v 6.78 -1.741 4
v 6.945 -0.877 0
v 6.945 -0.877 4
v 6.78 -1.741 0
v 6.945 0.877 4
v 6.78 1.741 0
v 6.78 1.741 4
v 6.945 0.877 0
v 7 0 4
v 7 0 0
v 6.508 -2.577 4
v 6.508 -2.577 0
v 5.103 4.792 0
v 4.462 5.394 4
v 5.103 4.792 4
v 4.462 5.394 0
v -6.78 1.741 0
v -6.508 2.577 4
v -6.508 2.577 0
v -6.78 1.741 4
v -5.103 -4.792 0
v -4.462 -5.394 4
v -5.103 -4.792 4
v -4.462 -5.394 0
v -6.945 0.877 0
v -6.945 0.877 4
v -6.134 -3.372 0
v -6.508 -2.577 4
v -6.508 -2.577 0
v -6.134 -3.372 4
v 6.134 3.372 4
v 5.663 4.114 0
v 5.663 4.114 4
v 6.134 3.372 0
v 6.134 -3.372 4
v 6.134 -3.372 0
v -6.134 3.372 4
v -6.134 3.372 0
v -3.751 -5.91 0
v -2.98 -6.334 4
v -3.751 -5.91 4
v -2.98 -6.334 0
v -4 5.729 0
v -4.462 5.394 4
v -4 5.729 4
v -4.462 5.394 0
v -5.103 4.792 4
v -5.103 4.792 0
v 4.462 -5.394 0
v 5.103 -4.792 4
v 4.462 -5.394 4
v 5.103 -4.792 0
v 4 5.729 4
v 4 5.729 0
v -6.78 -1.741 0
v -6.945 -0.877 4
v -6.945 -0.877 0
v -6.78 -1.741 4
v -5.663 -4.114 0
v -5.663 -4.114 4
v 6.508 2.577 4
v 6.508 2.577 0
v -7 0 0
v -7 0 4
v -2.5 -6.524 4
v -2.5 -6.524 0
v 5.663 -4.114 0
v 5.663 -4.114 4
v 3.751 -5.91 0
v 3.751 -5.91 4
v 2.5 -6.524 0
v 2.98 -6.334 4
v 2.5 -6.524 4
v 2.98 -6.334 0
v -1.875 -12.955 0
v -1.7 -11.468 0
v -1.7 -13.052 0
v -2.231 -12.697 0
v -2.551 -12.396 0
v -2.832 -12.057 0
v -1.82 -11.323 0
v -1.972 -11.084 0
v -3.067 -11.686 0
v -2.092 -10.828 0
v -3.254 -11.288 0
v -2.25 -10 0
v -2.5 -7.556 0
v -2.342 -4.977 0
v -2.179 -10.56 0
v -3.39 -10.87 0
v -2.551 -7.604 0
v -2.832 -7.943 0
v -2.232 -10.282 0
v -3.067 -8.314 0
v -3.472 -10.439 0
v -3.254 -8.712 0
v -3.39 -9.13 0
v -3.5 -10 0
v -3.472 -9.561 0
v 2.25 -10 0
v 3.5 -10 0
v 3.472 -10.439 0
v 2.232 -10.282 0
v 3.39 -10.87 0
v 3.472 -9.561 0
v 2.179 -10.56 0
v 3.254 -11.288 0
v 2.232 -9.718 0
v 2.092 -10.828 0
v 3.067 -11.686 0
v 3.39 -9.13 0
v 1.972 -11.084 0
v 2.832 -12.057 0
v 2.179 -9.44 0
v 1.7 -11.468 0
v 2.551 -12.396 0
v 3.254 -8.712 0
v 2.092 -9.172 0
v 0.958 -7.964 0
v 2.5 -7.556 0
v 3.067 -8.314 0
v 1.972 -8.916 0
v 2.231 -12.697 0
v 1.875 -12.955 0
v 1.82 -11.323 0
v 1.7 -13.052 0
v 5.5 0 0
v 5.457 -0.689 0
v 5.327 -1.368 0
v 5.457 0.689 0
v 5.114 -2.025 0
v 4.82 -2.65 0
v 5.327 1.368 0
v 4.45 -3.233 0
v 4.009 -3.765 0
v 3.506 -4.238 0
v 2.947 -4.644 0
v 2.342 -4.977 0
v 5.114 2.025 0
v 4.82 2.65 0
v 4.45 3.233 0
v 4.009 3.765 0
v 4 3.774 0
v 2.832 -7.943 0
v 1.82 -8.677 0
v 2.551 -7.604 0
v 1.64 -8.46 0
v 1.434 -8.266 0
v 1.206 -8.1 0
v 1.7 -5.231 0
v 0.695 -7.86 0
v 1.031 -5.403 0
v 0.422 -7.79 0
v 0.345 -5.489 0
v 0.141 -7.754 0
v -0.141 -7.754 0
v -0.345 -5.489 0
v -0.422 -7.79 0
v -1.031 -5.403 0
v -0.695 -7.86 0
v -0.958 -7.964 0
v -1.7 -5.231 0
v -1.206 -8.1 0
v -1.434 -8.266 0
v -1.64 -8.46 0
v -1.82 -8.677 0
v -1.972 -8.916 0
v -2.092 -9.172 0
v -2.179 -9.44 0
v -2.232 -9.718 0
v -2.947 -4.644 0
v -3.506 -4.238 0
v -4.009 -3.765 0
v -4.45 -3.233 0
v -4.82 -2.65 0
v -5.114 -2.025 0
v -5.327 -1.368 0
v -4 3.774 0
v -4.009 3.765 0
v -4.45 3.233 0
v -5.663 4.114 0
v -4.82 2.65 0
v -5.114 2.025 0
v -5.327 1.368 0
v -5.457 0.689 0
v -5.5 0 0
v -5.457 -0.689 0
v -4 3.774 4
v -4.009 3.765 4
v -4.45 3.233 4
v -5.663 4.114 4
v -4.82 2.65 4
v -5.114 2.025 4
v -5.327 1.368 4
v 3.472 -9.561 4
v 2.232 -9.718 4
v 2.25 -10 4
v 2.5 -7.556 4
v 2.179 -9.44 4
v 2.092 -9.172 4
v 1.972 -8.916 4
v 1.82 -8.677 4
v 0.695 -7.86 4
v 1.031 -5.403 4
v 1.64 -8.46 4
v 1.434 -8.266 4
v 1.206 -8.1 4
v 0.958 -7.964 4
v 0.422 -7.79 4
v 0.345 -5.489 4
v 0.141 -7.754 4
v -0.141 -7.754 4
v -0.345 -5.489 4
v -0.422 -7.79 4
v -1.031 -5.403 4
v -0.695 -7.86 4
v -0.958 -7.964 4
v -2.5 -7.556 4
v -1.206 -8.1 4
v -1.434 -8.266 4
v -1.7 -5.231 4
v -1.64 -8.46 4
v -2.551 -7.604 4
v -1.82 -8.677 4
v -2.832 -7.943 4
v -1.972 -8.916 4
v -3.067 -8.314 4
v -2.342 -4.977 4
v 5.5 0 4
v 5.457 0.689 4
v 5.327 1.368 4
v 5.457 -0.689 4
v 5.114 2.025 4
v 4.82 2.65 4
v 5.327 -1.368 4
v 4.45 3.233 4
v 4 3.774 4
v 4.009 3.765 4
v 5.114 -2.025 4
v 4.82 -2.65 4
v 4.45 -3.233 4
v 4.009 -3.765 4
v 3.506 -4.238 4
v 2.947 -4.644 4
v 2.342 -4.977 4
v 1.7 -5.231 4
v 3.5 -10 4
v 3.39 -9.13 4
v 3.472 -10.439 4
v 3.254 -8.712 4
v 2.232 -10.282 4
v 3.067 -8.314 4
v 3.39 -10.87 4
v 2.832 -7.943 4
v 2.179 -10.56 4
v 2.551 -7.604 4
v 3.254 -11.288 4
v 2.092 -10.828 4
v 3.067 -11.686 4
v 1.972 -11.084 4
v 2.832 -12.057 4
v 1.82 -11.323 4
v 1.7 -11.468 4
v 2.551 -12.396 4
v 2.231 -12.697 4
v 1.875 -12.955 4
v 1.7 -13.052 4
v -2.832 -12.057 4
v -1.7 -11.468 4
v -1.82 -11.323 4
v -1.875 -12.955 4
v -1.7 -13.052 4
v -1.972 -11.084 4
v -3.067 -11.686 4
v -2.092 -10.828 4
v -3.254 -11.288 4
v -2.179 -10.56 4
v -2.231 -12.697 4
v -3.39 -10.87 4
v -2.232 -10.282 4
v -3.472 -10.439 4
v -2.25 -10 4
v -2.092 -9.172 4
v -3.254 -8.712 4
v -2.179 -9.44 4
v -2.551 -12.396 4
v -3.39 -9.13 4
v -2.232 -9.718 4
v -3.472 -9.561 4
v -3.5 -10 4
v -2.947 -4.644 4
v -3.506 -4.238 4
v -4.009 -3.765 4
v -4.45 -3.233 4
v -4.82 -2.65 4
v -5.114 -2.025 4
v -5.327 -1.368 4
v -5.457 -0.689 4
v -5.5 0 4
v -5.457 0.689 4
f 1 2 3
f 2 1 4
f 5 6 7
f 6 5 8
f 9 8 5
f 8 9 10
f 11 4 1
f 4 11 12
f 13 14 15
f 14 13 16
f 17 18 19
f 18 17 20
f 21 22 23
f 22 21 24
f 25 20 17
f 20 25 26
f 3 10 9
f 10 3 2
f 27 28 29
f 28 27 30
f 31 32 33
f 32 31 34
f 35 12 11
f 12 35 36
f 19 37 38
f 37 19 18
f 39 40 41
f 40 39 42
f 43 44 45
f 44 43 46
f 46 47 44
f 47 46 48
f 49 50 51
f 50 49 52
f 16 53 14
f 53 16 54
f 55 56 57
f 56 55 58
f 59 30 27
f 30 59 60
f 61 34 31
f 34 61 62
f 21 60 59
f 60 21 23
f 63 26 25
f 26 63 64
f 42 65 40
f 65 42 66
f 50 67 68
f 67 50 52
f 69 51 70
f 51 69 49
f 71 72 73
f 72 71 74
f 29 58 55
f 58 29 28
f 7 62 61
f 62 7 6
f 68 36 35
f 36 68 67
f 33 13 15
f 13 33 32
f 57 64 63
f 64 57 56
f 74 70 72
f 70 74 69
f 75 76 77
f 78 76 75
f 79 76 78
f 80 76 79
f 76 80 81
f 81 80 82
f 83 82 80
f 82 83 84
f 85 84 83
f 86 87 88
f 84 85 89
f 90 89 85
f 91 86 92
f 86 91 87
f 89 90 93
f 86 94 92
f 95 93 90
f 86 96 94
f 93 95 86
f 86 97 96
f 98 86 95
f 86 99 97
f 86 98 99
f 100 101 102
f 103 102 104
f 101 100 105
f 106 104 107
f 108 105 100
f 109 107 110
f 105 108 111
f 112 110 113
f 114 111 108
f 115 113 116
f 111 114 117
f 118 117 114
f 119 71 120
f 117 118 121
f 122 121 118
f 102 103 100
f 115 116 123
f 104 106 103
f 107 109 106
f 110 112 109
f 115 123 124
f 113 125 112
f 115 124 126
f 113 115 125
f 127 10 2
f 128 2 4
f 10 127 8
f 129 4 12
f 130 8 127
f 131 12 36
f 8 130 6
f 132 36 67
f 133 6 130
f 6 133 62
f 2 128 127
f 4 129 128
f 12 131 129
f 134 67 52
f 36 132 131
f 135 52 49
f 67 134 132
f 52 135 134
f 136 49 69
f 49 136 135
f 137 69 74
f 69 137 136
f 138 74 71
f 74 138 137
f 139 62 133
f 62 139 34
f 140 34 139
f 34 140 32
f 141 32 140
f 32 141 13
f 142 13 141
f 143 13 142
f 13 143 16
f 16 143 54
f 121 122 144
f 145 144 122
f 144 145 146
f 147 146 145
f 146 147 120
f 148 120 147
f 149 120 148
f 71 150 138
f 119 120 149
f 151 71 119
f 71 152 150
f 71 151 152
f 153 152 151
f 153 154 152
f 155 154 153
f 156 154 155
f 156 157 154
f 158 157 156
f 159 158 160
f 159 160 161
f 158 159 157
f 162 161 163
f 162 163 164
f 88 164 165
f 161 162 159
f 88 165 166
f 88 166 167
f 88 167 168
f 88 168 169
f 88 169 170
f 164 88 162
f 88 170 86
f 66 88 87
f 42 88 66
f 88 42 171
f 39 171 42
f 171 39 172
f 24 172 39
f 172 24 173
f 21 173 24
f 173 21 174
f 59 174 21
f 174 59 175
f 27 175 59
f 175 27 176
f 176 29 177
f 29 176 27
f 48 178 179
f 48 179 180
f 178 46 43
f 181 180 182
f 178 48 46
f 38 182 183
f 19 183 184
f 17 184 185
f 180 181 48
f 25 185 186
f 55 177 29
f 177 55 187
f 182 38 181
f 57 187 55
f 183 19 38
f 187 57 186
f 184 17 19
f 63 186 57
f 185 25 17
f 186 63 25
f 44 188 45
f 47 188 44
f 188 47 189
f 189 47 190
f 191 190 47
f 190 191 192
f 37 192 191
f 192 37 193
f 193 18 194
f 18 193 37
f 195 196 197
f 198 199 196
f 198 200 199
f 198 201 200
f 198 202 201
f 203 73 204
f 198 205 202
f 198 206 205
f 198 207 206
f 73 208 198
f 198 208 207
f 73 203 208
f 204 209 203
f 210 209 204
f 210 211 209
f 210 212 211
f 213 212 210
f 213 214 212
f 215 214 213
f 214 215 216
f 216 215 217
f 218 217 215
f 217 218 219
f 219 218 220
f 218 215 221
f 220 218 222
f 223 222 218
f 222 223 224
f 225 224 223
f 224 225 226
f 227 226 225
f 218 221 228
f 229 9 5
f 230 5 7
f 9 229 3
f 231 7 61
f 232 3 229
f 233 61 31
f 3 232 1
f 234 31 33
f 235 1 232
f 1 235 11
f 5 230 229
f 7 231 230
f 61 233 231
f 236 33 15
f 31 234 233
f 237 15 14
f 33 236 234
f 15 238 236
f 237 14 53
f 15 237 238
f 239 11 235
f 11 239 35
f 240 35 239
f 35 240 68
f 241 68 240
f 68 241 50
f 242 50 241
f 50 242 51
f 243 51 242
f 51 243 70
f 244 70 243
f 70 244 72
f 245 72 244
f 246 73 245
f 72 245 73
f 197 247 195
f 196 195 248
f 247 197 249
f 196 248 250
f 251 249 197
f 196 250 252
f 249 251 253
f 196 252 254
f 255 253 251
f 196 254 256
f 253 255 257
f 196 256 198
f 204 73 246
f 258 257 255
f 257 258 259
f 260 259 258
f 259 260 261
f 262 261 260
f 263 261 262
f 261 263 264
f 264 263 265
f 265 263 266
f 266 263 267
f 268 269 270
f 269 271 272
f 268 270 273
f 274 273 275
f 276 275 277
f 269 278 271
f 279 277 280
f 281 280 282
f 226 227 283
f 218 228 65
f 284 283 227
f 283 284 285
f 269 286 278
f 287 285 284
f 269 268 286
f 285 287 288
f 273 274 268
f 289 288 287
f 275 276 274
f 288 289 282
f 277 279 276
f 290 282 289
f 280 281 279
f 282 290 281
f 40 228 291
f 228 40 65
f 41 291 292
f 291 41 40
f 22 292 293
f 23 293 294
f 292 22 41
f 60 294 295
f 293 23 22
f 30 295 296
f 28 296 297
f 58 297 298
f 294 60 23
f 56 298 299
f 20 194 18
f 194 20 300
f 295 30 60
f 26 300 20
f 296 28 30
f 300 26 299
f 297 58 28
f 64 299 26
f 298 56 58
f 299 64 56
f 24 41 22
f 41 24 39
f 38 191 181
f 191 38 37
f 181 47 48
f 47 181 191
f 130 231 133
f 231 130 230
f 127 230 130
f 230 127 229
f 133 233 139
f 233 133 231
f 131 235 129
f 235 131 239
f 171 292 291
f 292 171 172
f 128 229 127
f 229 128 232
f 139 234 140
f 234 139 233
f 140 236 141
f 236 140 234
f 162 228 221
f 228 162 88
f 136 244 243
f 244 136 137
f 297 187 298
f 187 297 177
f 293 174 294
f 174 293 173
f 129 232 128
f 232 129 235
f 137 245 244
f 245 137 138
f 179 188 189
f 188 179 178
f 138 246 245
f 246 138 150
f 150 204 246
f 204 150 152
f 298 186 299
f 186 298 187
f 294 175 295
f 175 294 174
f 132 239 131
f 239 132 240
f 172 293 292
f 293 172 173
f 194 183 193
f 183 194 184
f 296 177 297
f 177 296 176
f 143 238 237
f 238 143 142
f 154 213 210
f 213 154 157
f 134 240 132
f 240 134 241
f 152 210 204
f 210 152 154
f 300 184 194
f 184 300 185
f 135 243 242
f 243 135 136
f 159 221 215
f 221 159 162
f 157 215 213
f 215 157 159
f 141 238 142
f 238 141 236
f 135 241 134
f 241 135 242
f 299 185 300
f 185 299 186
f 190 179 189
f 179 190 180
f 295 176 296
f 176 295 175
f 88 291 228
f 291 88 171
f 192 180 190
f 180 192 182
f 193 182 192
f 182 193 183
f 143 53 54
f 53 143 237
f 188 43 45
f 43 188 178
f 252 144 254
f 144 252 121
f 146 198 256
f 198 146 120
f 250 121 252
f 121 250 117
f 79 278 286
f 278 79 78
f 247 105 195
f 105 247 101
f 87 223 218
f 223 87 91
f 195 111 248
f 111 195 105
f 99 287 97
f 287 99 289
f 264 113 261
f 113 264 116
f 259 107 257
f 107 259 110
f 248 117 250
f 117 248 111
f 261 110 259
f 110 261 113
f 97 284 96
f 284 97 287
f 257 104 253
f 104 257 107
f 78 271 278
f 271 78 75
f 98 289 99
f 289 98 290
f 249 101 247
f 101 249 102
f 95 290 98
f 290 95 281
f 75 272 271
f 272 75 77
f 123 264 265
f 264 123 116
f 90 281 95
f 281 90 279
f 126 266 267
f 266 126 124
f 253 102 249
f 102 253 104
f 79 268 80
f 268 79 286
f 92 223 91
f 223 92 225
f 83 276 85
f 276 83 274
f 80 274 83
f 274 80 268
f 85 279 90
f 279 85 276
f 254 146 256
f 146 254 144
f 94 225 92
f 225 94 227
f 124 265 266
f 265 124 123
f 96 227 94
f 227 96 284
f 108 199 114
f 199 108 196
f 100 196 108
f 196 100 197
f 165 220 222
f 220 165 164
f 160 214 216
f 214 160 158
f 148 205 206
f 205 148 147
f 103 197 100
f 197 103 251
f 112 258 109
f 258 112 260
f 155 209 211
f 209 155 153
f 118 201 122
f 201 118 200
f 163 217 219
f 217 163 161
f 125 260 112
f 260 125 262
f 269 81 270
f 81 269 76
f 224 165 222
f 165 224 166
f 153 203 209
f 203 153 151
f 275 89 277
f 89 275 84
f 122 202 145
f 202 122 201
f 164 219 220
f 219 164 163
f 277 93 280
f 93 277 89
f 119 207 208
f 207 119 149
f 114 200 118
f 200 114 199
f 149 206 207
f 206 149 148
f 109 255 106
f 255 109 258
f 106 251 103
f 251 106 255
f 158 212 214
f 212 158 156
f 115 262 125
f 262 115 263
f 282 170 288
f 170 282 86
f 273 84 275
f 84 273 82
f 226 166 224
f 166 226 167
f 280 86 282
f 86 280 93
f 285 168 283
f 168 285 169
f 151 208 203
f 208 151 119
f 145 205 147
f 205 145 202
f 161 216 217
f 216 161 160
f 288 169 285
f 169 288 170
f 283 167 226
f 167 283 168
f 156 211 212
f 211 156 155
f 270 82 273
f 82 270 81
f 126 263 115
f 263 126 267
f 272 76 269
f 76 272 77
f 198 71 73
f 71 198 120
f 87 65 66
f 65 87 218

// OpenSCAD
$fn=50;
difference(){
    cylinder(4,14/2,14/2);
    cylinder(4,11/2,11/2);
    //translate([0,7,0]) cylinder(4,11/2,11/2);
    translate([-4,3,0]) cube([8,6,4]);
}
difference(){
    translate([0,-10,0]) cylinder(4,7/2,7/2);
    translate([0,-10,0]) cylinder(4,4.5/2,4.5/2);
    //translate([0,-13,0]) cylinder(4,5/2,5/2);
    translate([-1.7,-16,0]) cube([3.4,7,4]);
}
translate([-2.5,-7.6,0]) cube([5,1.5,4]);
